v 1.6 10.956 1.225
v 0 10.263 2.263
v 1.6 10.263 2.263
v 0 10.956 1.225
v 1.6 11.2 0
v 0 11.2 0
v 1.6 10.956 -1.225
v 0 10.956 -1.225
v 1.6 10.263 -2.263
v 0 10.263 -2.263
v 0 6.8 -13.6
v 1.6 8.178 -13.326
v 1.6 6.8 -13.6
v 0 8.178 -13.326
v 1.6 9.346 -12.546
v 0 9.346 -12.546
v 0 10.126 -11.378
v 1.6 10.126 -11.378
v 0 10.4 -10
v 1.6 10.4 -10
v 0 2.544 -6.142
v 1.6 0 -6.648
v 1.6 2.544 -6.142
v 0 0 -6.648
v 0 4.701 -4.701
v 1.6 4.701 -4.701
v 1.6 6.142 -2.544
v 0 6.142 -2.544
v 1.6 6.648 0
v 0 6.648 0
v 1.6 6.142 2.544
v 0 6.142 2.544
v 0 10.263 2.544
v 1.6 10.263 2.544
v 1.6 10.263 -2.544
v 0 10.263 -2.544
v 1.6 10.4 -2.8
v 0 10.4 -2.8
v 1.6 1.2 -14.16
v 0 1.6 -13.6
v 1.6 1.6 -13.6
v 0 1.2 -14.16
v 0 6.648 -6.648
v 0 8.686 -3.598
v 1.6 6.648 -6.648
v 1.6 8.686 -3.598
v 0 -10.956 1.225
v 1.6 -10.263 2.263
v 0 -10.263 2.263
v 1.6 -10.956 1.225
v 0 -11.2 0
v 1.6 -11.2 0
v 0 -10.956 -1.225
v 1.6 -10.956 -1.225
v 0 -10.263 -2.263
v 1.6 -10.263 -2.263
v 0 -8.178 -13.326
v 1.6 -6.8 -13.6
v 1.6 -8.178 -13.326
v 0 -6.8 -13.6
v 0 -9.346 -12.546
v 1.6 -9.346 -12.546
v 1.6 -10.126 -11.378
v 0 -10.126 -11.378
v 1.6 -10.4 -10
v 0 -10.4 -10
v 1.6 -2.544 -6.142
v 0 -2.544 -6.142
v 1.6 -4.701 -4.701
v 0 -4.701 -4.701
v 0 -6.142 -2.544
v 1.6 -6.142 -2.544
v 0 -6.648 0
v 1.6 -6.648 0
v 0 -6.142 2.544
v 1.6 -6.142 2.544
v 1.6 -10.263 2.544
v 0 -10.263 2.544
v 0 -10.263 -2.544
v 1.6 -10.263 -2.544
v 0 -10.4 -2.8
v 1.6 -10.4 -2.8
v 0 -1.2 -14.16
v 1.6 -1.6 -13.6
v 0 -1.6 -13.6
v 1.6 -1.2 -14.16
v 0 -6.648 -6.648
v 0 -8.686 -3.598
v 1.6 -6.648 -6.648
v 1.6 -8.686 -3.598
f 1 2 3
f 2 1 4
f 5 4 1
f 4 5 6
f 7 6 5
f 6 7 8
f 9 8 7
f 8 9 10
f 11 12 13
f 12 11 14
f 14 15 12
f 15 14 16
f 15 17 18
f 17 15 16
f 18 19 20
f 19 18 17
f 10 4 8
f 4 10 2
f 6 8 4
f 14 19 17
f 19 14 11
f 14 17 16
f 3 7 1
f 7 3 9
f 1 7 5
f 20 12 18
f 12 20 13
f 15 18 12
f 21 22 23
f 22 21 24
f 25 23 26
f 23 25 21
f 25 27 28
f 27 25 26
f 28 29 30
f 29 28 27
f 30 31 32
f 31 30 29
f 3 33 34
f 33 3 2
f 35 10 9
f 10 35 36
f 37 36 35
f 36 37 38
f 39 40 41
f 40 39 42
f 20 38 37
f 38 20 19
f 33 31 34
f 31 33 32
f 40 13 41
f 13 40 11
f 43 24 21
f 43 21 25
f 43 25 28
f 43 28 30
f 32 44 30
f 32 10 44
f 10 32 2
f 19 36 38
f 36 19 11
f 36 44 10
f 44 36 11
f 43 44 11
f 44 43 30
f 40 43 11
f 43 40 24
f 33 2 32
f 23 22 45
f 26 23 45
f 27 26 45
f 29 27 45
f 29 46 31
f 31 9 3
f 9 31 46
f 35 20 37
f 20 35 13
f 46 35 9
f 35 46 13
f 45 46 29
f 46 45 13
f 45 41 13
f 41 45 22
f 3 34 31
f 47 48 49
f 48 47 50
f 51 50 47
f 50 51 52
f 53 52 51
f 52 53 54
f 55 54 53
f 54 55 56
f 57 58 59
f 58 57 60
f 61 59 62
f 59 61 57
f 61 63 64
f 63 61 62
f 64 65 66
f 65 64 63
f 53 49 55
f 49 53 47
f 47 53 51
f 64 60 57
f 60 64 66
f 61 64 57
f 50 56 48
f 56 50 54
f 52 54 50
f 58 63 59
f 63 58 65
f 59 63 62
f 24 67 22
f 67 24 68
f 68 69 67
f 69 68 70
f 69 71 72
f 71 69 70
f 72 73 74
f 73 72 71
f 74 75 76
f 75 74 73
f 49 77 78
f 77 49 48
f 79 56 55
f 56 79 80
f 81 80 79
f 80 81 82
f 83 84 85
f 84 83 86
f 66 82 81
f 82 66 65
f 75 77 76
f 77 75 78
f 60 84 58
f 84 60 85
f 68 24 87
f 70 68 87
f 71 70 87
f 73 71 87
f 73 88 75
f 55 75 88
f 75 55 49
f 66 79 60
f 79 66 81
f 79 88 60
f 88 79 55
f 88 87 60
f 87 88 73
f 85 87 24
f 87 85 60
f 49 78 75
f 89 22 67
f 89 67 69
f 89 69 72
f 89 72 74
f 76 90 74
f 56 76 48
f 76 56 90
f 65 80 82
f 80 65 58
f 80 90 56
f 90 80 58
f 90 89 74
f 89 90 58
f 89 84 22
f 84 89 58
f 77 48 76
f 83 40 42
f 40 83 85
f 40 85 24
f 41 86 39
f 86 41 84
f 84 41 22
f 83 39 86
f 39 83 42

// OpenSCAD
// file: ../p/5-16edge.scad
use <../lib.scad>
function ldraw_lib__5_16edge() = [
// 0 Circle 0.3125
// 0 Name: 5-16edge.dat
// 0 Author: Philippe Hurbain [Philo]
// 0 !LDRAW_ORG Primitive UPDATE 2009-03
// 0 !LICENSE Licensed under CC BY 2.0 and CC BY 4.0 : see CAreadme.txt
// 
// 0 BFC CERTIFY CCW
  [0,"BFC","CERTIFY"],
  [0,"BFC","CCW"],
// 
// 0 !HISTORY 2009-12-29 [PTadmin] Official Update 2009-03
// 
// 
// 2 24 1 0 0 0.9239 0 0.3827
  [2,24,1,0,0,0.9239,0,0.3827],
// 2 24 0.9239 0 0.3827 0.7071 0 0.7071
  [2,24,0.9239,0,0.3827,0.7071,0,0.7071],
// 2 24 0.7071 0 0.7071 0.3827 0 0.9239
  [2,24,0.7071,0,0.7071,0.3827,0,0.9239],
// 2 24 0.3827 0 0.9239 0 0 1
  [2,24,0.3827,0,0.9239,0,0,1],
// 2 24 0 0 1 -0.3827 0 0.9239
  [2,24,0,0,1,-0.3827,0,0.9239],
// 
// 0 end of file
// 
];
module ldraw_lib__5_16edge(step=0, col=false, unit=2/5, alt=false, line=0.2, solid=!$preview)
    makepoly(ldraw_lib__5_16edge(), step=step, col=col, unit=unit, alt=alt, line=line, solid=solid);
ldraw_lib__5_16edge(line=0.2);
// file: ../p/5-16cyli.scad
use <../lib.scad>
function ldraw_lib__5_16cyli() = [
// 0 Cylinder 0.3125
// 0 Name: 5-16cyli.dat
// 0 Author: Philippe Hurbain [Philo]
// 0 !LDRAW_ORG Primitive UPDATE 2009-03
// 0 !LICENSE Licensed under CC BY 2.0 and CC BY 4.0 : see CAreadme.txt
// 
// 0 BFC CERTIFY CCW
  [0,"BFC","CERTIFY"],
  [0,"BFC","CCW"],
// 
// 0 !HISTORY 2009-12-29 [PTadmin] Official Update 2009-03
// 
// 
// 4 16 0.9239 0 0.3827 1 0 0 1 1 0 0.9239 1 0.3827
  [4,16,0.9239,0,0.3827,1,0,0,1,1,0,0.9239,1,0.3827],
// 4 16 0.7071 0 0.7071 0.9239 0 0.3827 0.9239 1 0.3827 0.7071 1 0.7071
  [4,16,0.7071,0,0.7071,0.9239,0,0.3827,0.9239,1,0.3827,0.7071,1,0.7071],
// 4 16 0.3827 0 0.9239 0.7071 0 0.7071 0.7071 1 0.7071 0.3827 1 0.9239
  [4,16,0.3827,0,0.9239,0.7071,0,0.7071,0.7071,1,0.7071,0.3827,1,0.9239],
// 4 16 0 0 1 0.3827 0 0.9239 0.3827 1 0.9239 0 1 1
  [4,16,0,0,1,0.3827,0,0.9239,0.3827,1,0.9239,0,1,1],
// 4 16 -0.3827 0 0.9239 0 0 1 0 1 1 -0.3827 1 0.9239
  [4,16,-0.3827,0,0.9239,0,0,1,0,1,1,-0.3827,1,0.9239],
// 
// 0 conditional lines
// 5 24 1 1 0 1 0 0 1 1 -0.4142 0.9239 1 0.3827
  [5,24,1,1,0,1,0,0,1,1,-0.4142,0.9239,1,0.3827],
// 5 24 0.9239 1 0.3827 0.9239 0 0.3827 1 1 0 0.7071 1 0.7071
  [5,24,0.9239,1,0.3827,0.9239,0,0.3827,1,1,0,0.7071,1,0.7071],
// 5 24 0.7071 1 0.7071 0.7071 0 0.7071 0.9239 1 0.3827 0.3827 1 0.9239
  [5,24,0.7071,1,0.7071,0.7071,0,0.7071,0.9239,1,0.3827,0.3827,1,0.9239],
// 5 24 0.3827 1 0.9239 0.3827 0 0.9239 0.7071 1 0.7071 0 1 1
  [5,24,0.3827,1,0.9239,0.3827,0,0.9239,0.7071,1,0.7071,0,1,1],
// 5 24 0 1 1 0 0 1 0.3827 1 0.9239 -0.3827 1 0.9239
  [5,24,0,1,1,0,0,1,0.3827,1,0.9239,-0.3827,1,0.9239],
// 5 24 -0.3827 1 0.9239 -0.3827 0 0.9239 0 1 1 -0.7654 1 0.7654
  [5,24,-0.3827,1,0.9239,-0.3827,0,0.9239,0,1,1,-0.7654,1,0.7654],
// 
// 0 end of file
// 
];
module ldraw_lib__5_16cyli(step=0, col=false, unit=2/5, alt=false, line=0.2, solid=!$preview)
    makepoly(ldraw_lib__5_16cyli(), step=step, col=col, unit=unit, alt=alt, line=line, solid=solid);
ldraw_lib__5_16cyli(line=0.2);
// file: ../p/1-4edge.scad
use <../lib.scad>
function ldraw_lib__1_4edge() = [
// 0 Circle 0.25
// 0 Name: 1-4edge.dat
// 0 Author: James Jessiman
// 0 !LDRAW_ORG Primitive UPDATE 2017-01
// 0 !LICENSE Licensed under CC BY 2.0 and CC BY 4.0 : see CAreadme.txt
// 
// 0 BFC CERTIFY CCW
  [0,"BFC","CERTIFY"],
  [0,"BFC","CCW"],
// 
// 0 !HISTORY 2007-06-22 [PTadmin] Header formatted for Contributor Agreement
// 0 !HISTORY 2008-07-01 [PTadmin] Official Update 2008-01
// 0 !HISTORY 2017-01-15 [Steffen] BFCed
// 0 !HISTORY 2017-12-30 [PTadmin] Official Update 2017-01
// 
// 
// 2 24 1 0 0 0.9239 0 0.3827
  [2,24,1,0,0,0.9239,0,0.3827],
// 2 24 0.9239 0 0.3827 0.7071 0 0.7071
  [2,24,0.9239,0,0.3827,0.7071,0,0.7071],
// 2 24 0.7071 0 0.7071 0.3827 0 0.9239
  [2,24,0.7071,0,0.7071,0.3827,0,0.9239],
// 2 24 0.3827 0 0.9239 0 0 1
  [2,24,0.3827,0,0.9239,0,0,1],
];
module ldraw_lib__1_4edge(step=0, col=false, unit=2/5, alt=false, line=0.2, solid=!$preview)
    makepoly(ldraw_lib__1_4edge(), step=step, col=col, unit=unit, alt=alt, line=line, solid=solid);
ldraw_lib__1_4edge(line=0.2);
// file: ../p/1-4cyli.scad
use <../lib.scad>
function ldraw_lib__1_4cyli() = [
// 0 Cylinder 0.25
// 0 Name: 1-4cyli.dat
// 0 Author: James Jessiman
// 0 !LDRAW_ORG Primitive UPDATE 2012-01
// 0 !LICENSE Licensed under CC BY 2.0 and CC BY 4.0 : see CAreadme.txt
// 
// 0 BFC CERTIFY CCW
  [0,"BFC","CERTIFY"],
  [0,"BFC","CCW"],
// 
// 0 !HISTORY 2002-03-23 [sbliss] Added BFC statement.
// 0 !HISTORY 2002-04-25 [PTadmin] Official Update 2002-02
// 0 !HISTORY 2007-06-22 [PTadmin] Header formatted for Contributor Agreement
// 0 !HISTORY 2008-07-01 [PTadmin] Official Update 2008-01
// 0 !HISTORY 2012-02-16 [Philo] Changed to CCW
// 0 !HISTORY 2012-03-30 [PTadmin] Official Update 2012-01
// 
// 
// 4 16 1 1 0 0.9239 1 0.3827 0.9239 0 0.3827 1 0 0
  [4,16,1,1,0,0.9239,1,0.3827,0.9239,0,0.3827,1,0,0],
// 5 24 1 0 0 1 1 0 0.9239 0 0.3827 1 0 -1
  [5,24,1,0,0,1,1,0,0.9239,0,0.3827,1,0,-1],
// 4 16 0.9239 1 0.3827 0.7071 1 0.7071 0.7071 0 0.7071 0.9239 0 0.3827
  [4,16,0.9239,1,0.3827,0.7071,1,0.7071,0.7071,0,0.7071,0.9239,0,0.3827],
// 5 24 0.9239 0 0.3827 0.9239 1 0.3827 0.7071 0 0.7071 1 0 0
  [5,24,0.9239,0,0.3827,0.9239,1,0.3827,0.7071,0,0.7071,1,0,0],
// 4 16 0.7071 1 0.7071 0.3827 1 0.9239 0.3827 0 0.9239 0.7071 0 0.7071
  [4,16,0.7071,1,0.7071,0.3827,1,0.9239,0.3827,0,0.9239,0.7071,0,0.7071],
// 5 24 0.7071 0 0.7071 0.7071 1 0.7071 0.3827 0 0.9239 0.9239 0 0.3827
  [5,24,0.7071,0,0.7071,0.7071,1,0.7071,0.3827,0,0.9239,0.9239,0,0.3827],
// 4 16 0.3827 1 0.9239 0 1 1 0 0 1 0.3827 0 0.9239
  [4,16,0.3827,1,0.9239,0,1,1,0,0,1,0.3827,0,0.9239],
// 5 24 0.3827 0 0.9239 0.3827 1 0.9239 0 0 1 0.7071 0 0.7071
  [5,24,0.3827,0,0.9239,0.3827,1,0.9239,0,0,1,0.7071,0,0.7071],
// 5 24 0 0 1 0 1 1 0.3827 0 0.9239 -1 0 1
  [5,24,0,0,1,0,1,1,0.3827,0,0.9239,-1,0,1],
];
module ldraw_lib__1_4cyli(step=0, col=false, unit=2/5, alt=false, line=0.2, solid=!$preview)
    makepoly(ldraw_lib__1_4cyli(), step=step, col=col, unit=unit, alt=alt, line=line, solid=solid);
ldraw_lib__1_4cyli(line=0.2);
// file: ../p/rect3.scad
use <../lib.scad>
function ldraw_lib__rect3() = [
// 0 Rectangle with 3 Edges
// 0 Name: rect3.dat
// 0 Author: Mark Kennedy [mkennedy]
// 0 !LDRAW_ORG Primitive UPDATE 2010-01
// 0 !LICENSE Licensed under CC BY 2.0 and CC BY 4.0 : see CAreadme.txt
// 
// 0 BFC CERTIFY CCW
  [0,"BFC","CERTIFY"],
  [0,"BFC","CCW"],
// 
// 0 !HISTORY 2003-08-01 [PTadmin] Official Update 2003-02
// 0 !HISTORY 2007-06-24 [PTadmin] Header formatted for Contributor Agreement
// 0 !HISTORY 2008-07-01 [PTadmin] Official Update 2008-01
// 0 !HISTORY 2010-01-17 [mikeheide] Change winding to CCW
// 0 !HISTORY 2010-04-05 [PTadmin] Official Update 2010-01
// 
// 
// 2 24 1 0 1 -1 0 1
  [2,24,1,0,1,-1,0,1],
// 2 24 1 0 1 1 0 -1
  [2,24,1,0,1,1,0,-1],
// 2 24 -1 0 1 -1 0 -1
  [2,24,-1,0,1,-1,0,-1],
// 4 16 -1 0 1 -1 0 -1 1 0 -1 1 0 1
  [4,16,-1,0,1,-1,0,-1,1,0,-1,1,0,1],
// 0 //
];
module ldraw_lib__rect3(step=0, col=false, unit=2/5, alt=false, line=0.2, solid=!$preview)
    makepoly(ldraw_lib__rect3(), step=step, col=col, unit=unit, alt=alt, line=line, solid=solid);
ldraw_lib__rect3(line=0.2);
// file: ../p/rect2p.scad
use <../lib.scad>
function ldraw_lib__rect2p() = [
// 0 Rectangle with 2 Parallel Edges
// 0 Name: rect2p.dat
// 0 Author: Donald Sutter [technog]
// 0 !LDRAW_ORG Primitive UPDATE 2010-01
// 0 !LICENSE Licensed under CC BY 2.0 and CC BY 4.0 : see CAreadme.txt
// 
// 0 BFC CERTIFY CCW
  [0,"BFC","CERTIFY"],
  [0,"BFC","CCW"],
// 
// 0 !HISTORY 2003-08-01 [PTadmin] Official Update 2003-02
// 0 !HISTORY 2007-06-24 [PTadmin] Header formatted for Contributor Agreement
// 0 !HISTORY 2008-07-01 [PTadmin] Official Update 2008-01
// 0 !HISTORY 2010-01-17 [mikeheide] changed winding to CCW
// 0 !HISTORY 2010-04-05 [PTadmin] Official Update 2010-01
// 
// 
// 2 24 1 0 1 -1 0 1
  [2,24,1,0,1,-1,0,1],
// 2 24 -1 0 -1 1 0 -1
  [2,24,-1,0,-1,1,0,-1],
// 4 16 -1 0 1 -1 0 -1 1 0 -1 1 0 1
  [4,16,-1,0,1,-1,0,-1,1,0,-1,1,0,1],
// 0
];
module ldraw_lib__rect2p(step=0, col=false, unit=2/5, alt=false, line=0.2, solid=!$preview)
    makepoly(ldraw_lib__rect2p(), step=step, col=col, unit=unit, alt=alt, line=line, solid=solid);
ldraw_lib__rect2p(line=0.2);
// file: ../p/rect.scad
use <../lib.scad>
function ldraw_lib__rect() = [
// 0 Rectangle
// 0 Name: rect.dat
// 0 Author: James Jessiman
// 0 !LDRAW_ORG Primitive UPDATE 2010-01
// 0 !LICENSE Licensed under CC BY 2.0 and CC BY 4.0 : see CAreadme.txt
// 
// 0 BFC CERTIFY CCW
  [0,"BFC","CERTIFY"],
  [0,"BFC","CCW"],
// 
// 0 !HISTORY 2002-04-05 [hafhead] Added BFC statement
// 0 !HISTORY 2002-04-25 [PTadmin] Official Update 2002-02
// 0 !HISTORY 2007-06-24 [PTadmin] Header formatted for Contributor Agreement
// 0 !HISTORY 2008-07-01 [PTadmin] Official Update 2008-01
// 0 !HISTORY 2010-01-17 [mikeheide] changed winding to CCW
// 0 !HISTORY 2010-04-05 [PTadmin] Official Update 2010-01
// 
// 
// 2 24 1 0 1 -1 0 1
  [2,24,1,0,1,-1,0,1],
// 2 24 -1 0 1 -1 0 -1
  [2,24,-1,0,1,-1,0,-1],
// 2 24 -1 0 -1 1 0 -1
  [2,24,-1,0,-1,1,0,-1],
// 2 24 1 0 -1 1 0 1
  [2,24,1,0,-1,1,0,1],
// 4 16 -1 0 1 -1 0 -1 1 0 -1 1 0 1
  [4,16,-1,0,1,-1,0,-1,1,0,-1,1,0,1],
// 0
];
module ldraw_lib__rect(step=0, col=false, unit=2/5, alt=false, line=0.2, solid=!$preview)
    makepoly(ldraw_lib__rect(), step=step, col=col, unit=unit, alt=alt, line=line, solid=solid);
ldraw_lib__rect(line=0.2);
// file: ../p/5-16cylo.scad
use <../lib.scad>
use <5-16cyli.scad>
use <5-16edge.scad>
function ldraw_lib__5_16cylo() = [
// 0 Cylinder Open 0.3125
// 0 Name: 5-16cylo.dat
// 0 Author: Max Martin Richter [MMR1988]
// 0 !LDRAW_ORG Primitive UPDATE 2013-01
// 0 !LICENSE Licensed under CC BY 2.0 and CC BY 4.0 : see CAreadme.txt
// 
// 0 BFC CERTIFY CCW
  [0,"BFC","CERTIFY"],
  [0,"BFC","CCW"],
// 
// 0 !HISTORY 2013-07-21 [PTadmin] Official Update 2013-01
// 
// 
// 1 16 0 0 0 1 0 0 0 1 0 0 0 1 5-16cyli.dat
  [1,16,0,0,0,1,0,0,0,1,0,0,0,1, ldraw_lib__5_16cyli()],
// 1 16 0 0 0 1 0 0 0 1 0 0 0 1 5-16edge.dat
  [1,16,0,0,0,1,0,0,0,1,0,0,0,1, ldraw_lib__5_16edge()],
// 1 16 0 1 0 1 0 0 0 1 0 0 0 1 5-16edge.dat
  [1,16,0,1,0,1,0,0,0,1,0,0,0,1, ldraw_lib__5_16edge()],
];
module ldraw_lib__5_16cylo(step=0, col=false, unit=2/5, alt=false, line=0.2, solid=!$preview)
    makepoly(ldraw_lib__5_16cylo(), step=step, col=col, unit=unit, alt=alt, line=line, solid=solid);
ldraw_lib__5_16cylo(line=0.2);
// file: ../p/1-4ndis.scad
use <../lib.scad>
function ldraw_lib__1_4ndis() = [
// 0 Disc Negative 0.25
// 0 Name: 1-4ndis.dat
// 0 Author: James Jessiman
// 0 !LDRAW_ORG Primitive UPDATE 2012-01
// 0 !LICENSE Licensed under CC BY 2.0 and CC BY 4.0 : see CAreadme.txt
// 
// 0 BFC CERTIFY CCW
  [0,"BFC","CERTIFY"],
  [0,"BFC","CCW"],
// 
// 0 !HISTORY 2002-03-23 [sbliss] Added BFC Statement
// 0 !HISTORY 2002-04-25 [PTadmin] Official Update 2002-02
// 0 !HISTORY 2007-06-22 [PTadmin] Header formatted for Contributor Agreement
// 0 !HISTORY 2008-07-01 [PTadmin] Official Update 2008-01
// 0 !HISTORY 2012-02-16 [Philo] Changed to CCW
// 0 !HISTORY 2012-03-30 [PTadmin] Official Update 2012-01
// 
// 
// 3 16 0.9239 0 0.3827 1 0 0 1 0 1
  [3,16,0.9239,0,0.3827,1,0,0,1,0,1],
// 3 16 0.7071 0 0.7071 0.9239 0 0.3827 1 0 1
  [3,16,0.7071,0,0.7071,0.9239,0,0.3827,1,0,1],
// 3 16 0.3827 0 0.9239 0.7071 0 0.7071 1 0 1
  [3,16,0.3827,0,0.9239,0.7071,0,0.7071,1,0,1],
// 3 16 0 0 1 0.3827 0 0.9239 1 0 1
  [3,16,0,0,1,0.3827,0,0.9239,1,0,1],
];
module ldraw_lib__1_4ndis(step=0, col=false, unit=2/5, alt=false, line=0.2, solid=!$preview)
    makepoly(ldraw_lib__1_4ndis(), step=step, col=col, unit=unit, alt=alt, line=line, solid=solid);
ldraw_lib__1_4ndis(line=0.2);
// file: ../p/1-4cylo.scad
use <../lib.scad>
use <1-4cyli.scad>
use <1-4edge.scad>
function ldraw_lib__1_4cylo() = [
// 0 Cylinder Open 0.25
// 0 Name: 1-4cylo.dat
// 0 Author: Max Martin Richter [MMR1988]
// 0 !LDRAW_ORG Primitive UPDATE 2010-03
// 0 !LICENSE Licensed under CC BY 2.0 and CC BY 4.0 : see CAreadme.txt
// 
// 0 BFC CERTIFY CCW
  [0,"BFC","CERTIFY"],
  [0,"BFC","CCW"],
// 
// 0 !HISTORY 2010-12-31 [PTadmin] Official Update 2010-03
// 
// 
// 1 16 0 0 0 1 0 0 0 1 0 0 0 1 1-4edge.dat
  [1,16,0,0,0,1,0,0,0,1,0,0,0,1, ldraw_lib__1_4edge()],
// 1 16 0 1 0 1 0 0 0 1 0 0 0 1 1-4edge.dat
  [1,16,0,1,0,1,0,0,0,1,0,0,0,1, ldraw_lib__1_4edge()],
// 1 16 0 0 0 1 0 0 0 1 0 0 0 1 1-4cyli.dat
  [1,16,0,0,0,1,0,0,0,1,0,0,0,1, ldraw_lib__1_4cyli()],
];
module ldraw_lib__1_4cylo(step=0, col=false, unit=2/5, alt=false, line=0.2, solid=!$preview)
    makepoly(ldraw_lib__1_4cylo(), step=step, col=col, unit=unit, alt=alt, line=line, solid=solid);
ldraw_lib__1_4cylo(line=0.2);
// file: ../p/1-4chrd.scad
use <../lib.scad>
function ldraw_lib__1_4chrd() = [
// 0 Chord 0.25
// 0 Name: 1-4chrd.dat
// 0 Author: Tony Hafner [hafhead]
// 0 !LDRAW_ORG Primitive UPDATE 2012-02
// 0 !LICENSE Licensed under CC BY 2.0 and CC BY 4.0 : see CAreadme.txt
// 
// 0 BFC CERTIFY CCW
  [0,"BFC","CERTIFY"],
  [0,"BFC","CCW"],
// 
// 0 !HISTORY 2004-04-22 [PTadmin] Official Update 2004-02
// 0 !HISTORY 2007-10-09 [PTadmin] Header formatted for Contributor Agreement
// 0 !HISTORY 2008-07-01 [PTadmin] Official Update 2008-01
// 0 !HISTORY 2012-08-02 [MMR1988] Re-creation with PrimGen2 and Rectifier
// 0 !HISTORY 2012-08-09 [PTadmin] Official Update 2012-02
// 
// 
// 4 16 0.9239 0 0.3827 0.3827 0 0.9239 0 0 1 1 0 0
  [4,16,0.9239,0,0.3827,0.3827,0,0.9239,0,0,1,1,0,0],
// 3 16 0.7071 0 0.7071 0.3827 0 0.9239 0.9239 0 0.3827
  [3,16,0.7071,0,0.7071,0.3827,0,0.9239,0.9239,0,0.3827],
];
module ldraw_lib__1_4chrd(step=0, col=false, unit=2/5, alt=false, line=0.2, solid=!$preview)
    makepoly(ldraw_lib__1_4chrd(), step=step, col=col, unit=unit, alt=alt, line=line, solid=solid);
ldraw_lib__1_4chrd(line=0.2);
// file: ../p/1-16ndis.scad
use <../lib.scad>
function ldraw_lib__1_16ndis() = [
// 0 Disc Negative 0.0625
// 0 Name: 1-16ndis.dat
// 0 Author: Niels Karsdorp [nielsk]
// 0 !LDRAW_ORG Primitive UPDATE 2009-01
// 0 !LICENSE Licensed under CC BY 2.0 and CC BY 4.0 : see CAreadme.txt
// 
// 0 BFC CERTIFY CCW
  [0,"BFC","CERTIFY"],
  [0,"BFC","CCW"],
// 
// 0 !HISTORY 2009-05-02 [PTadmin] Official Update 2009-01
// 
// 
// 3 16 1 0 0 1 0 1 0.9239 0 0.3827
  [3,16,1,0,0,1,0,1,0.9239,0,0.3827],
// 0
];
module ldraw_lib__1_16ndis(step=0, col=false, unit=2/5, alt=false, line=0.2, solid=!$preview)
    makepoly(ldraw_lib__1_16ndis(), step=step, col=col, unit=unit, alt=alt, line=line, solid=solid);
ldraw_lib__1_16ndis(line=0.2);
// main file
use <../lib.scad>
use <../p/1-16ndis.scad>
use <../p/1-4chrd.scad>
use <../p/1-4cylo.scad>
use <../p/1-4ndis.scad>
use <../p/5-16cylo.scad>
use <../p/rect.scad>
use <../p/rect2p.scad>
use <../p/rect3.scad>
function ldraw_lib__u9418() = [
// 0 ~Technic Pneumatic Valve with Axle Hole Back Cover
// 0 Name: u9418.dat
// 0 Author: Philippe Hurbain [Philo]
// 0 !LDRAW_ORG Part UPDATE 2019-02
// 0 !LICENSE Licensed under CC BY 2.0 and CC BY 4.0 : see CAreadme.txt
// 
// 0 BFC CERTIFY CCW
  [0,"BFC","CERTIFY"],
  [0,"BFC","CCW"],
// 
// 0 !HISTORY 2019-09-09 [PTadmin] Official Update 2019-02
// 
// 
// 1 16 0 0 20 0 4 0 -5.65685 0 5.65685 5.65685 0 5.65685 1-4cylo.dat
  [1,16,0,0,20,0,4,0,-5.65685,0,5.65685,5.65685,0,5.65685, ldraw_lib__1_4cylo()],
// 1 16 0 25 17 0 4 0 9 0 0 0 0 9 1-4cylo.dat
  [1,16,0,25,17,0,4,0,9,0,0,0,0,9, ldraw_lib__1_4cylo()],
// 1 16 0 0 20 0 1 0 -5.65685 0 5.65685 5.65685 0 5.65685 1-4chrd.dat
  [1,16,0,0,20,0,1,0,-5.65685,0,5.65685,5.65685,0,5.65685, ldraw_lib__1_4chrd()],
// 1 16 0 25 17 0 1 0 9 0 0 0 0 9 1-4chrd.dat
  [1,16,0,25,17,0,1,0,9,0,0,0,0,9, ldraw_lib__1_4chrd()],
// 1 16 4 0 20 0 -1 0 -5.65685 0 5.65685 5.65685 0 5.65685 1-4chrd.dat
  [1,16,4,0,20,0,-1,0,-5.65685,0,5.65685,5.65685,0,5.65685, ldraw_lib__1_4chrd()],
// 1 16 4 25 17 0 -1 0 9 0 0 0 0 9 1-4chrd.dat
  [1,16,4,25,17,0,-1,0,9,0,0,0,0,9, ldraw_lib__1_4chrd()],
// 0 BFC INVERTNEXT
  [0,"BFC","INVERTNEXT"],
// 1 16 0 0 0 0 4 0 16.62 0 0 0 0 16.62 5-16cylo.dat
  [1,16,0,0,0,0,4,0,16.62,0,0,0,0,16.62, ldraw_lib__5_16cylo()],
// 1 16 2 -6.0087 25.6569 2 0 0 0 0 0.3518 0 -1 0 rect.dat
  [1,16,2,-6.0087,25.6569,2,0,0,0,0,0.3518,0,-1,0, ldraw_lib__rect()],
// 1 16 2 6.0087 25.6569 0 0 -2 0.3518 0 0 0 -1 0 rect.dat
  [1,16,2,6.0087,25.6569,0,0,-2,0.3518,0,0,0,-1,0, ldraw_lib__rect()],
// 1 16 2 6.68025 25.82845 2 0 0 0 0 0.31975 0 -1 0.17155 rect3.dat
  [1,16,2,6.68025,25.82845,2,0,0,0,0,0.31975,0,-1,0.17155, ldraw_lib__rect3()],
// 1 16 2 34.7 3.5 2 0 0 0 0 0.7 0 -1 -0.5 rect.dat
  [1,16,2,34.7,3.5,2,0,0,0,0,0.7,0,-1,-0.5, ldraw_lib__rect()],
// 
// 1 16 2 16 26 0 0 2 -9 0 0 0 -1 0 rect2p.dat
  [1,16,2,16,26,0,0,2,-9,0,0,0,-1,0, ldraw_lib__rect2p()],
// 1 16 2 -6.3605 20.50605 -2 0 0 0 1 0 0 0 -5.15085 rect3.dat
  [1,16,2,-6.3605,20.50605,-2,0,0,0,1,0,0,0,-5.15085, ldraw_lib__rect3()],
// 1 16 2 34 10.5 0 0 2 0 -1 0 6.5 0 0 rect2p.dat
  [1,16,2,34,10.5,0,0,2,0,-1,0,6.5,0,0, ldraw_lib__rect2p()],
// 1 16 0 0 0 0 1 0 16.62 0 0 0 0 16.62 1-4ndis.dat
  [1,16,0,0,0,0,1,0,16.62,0,0,0,0,16.62, ldraw_lib__1_4ndis()],
// 1 16 0 0 0 0 1 0 -6.3602 0 15.35488 15.35488 0 6.3602 1-16ndis.dat
  [1,16,0,0,0,0,1,0,-6.3602,0,15.35488,15.35488,0,6.3602, ldraw_lib__1_16ndis()],
// 4 16 0 5.6569 25.6569 0 8.9947 21.7151 0 -6.3605 15.3552 0 -5.6569 25.6569
  [4,16,0,5.6569,25.6569,0,8.9947,21.7151,0,-6.3605,15.3552,0,-5.6569,25.6569],
// 4 16 0 7 26 0 25 26 0 34 17 0 6.3605 25.6569
  [4,16,0,7,26,0,25,26,0,34,17,0,6.3605,25.6569],
// 4 16 0 5.6569 25.6569 0 6.3605 25.6569 0 34 17 0 8.9947 21.7151
  [4,16,0,5.6569,25.6569,0,6.3605,25.6569,0,34,17,0,8.9947,21.7151],
// 4 16 0 8.9947 21.7151 0 34 17 0 16.62 16.62 0 0 16.62
  [4,16,0,8.9947,21.7151,0,34,17,0,16.62,16.62,0,0,16.62],
// 4 16 0 16.62 0 0 16.62 16.62 0 34 17 0 34 4
  [4,16,0,16.62,0,0,16.62,16.62,0,34,17,0,34,4],
// 3 16 0 -6.3605 25.6569 0 -5.6569 25.6569 0 -6.3605 15.3552
  [3,16,0,-6.3605,25.6569,0,-5.6569,25.6569,0,-6.3605,15.3552],
// 1 16 4 0 0 0 -1 0 16.62 0 0 0 0 16.62 1-4ndis.dat
  [1,16,4,0,0,0,-1,0,16.62,0,0,0,0,16.62, ldraw_lib__1_4ndis()],
// 1 16 4 0 0 0 -1 0 -6.3602 0 15.35488 15.35488 0 6.3602 1-16ndis.dat
  [1,16,4,0,0,0,-1,0,-6.3602,0,15.35488,15.35488,0,6.3602, ldraw_lib__1_16ndis()],
// 4 16 4 -6.3605 15.3552 4 8.9947 21.7151 4 5.6569 25.6569 4 -5.6569 25.6569
  [4,16,4,-6.3605,15.3552,4,8.9947,21.7151,4,5.6569,25.6569,4,-5.6569,25.6569],
// 4 16 4 34 17 4 25 26 4 7 26 4 6.3605 25.6569
  [4,16,4,34,17,4,25,26,4,7,26,4,6.3605,25.6569],
// 4 16 4 34 17 4 6.3605 25.6569 4 5.6569 25.6569 4 8.9947 21.7151
  [4,16,4,34,17,4,6.3605,25.6569,4,5.6569,25.6569,4,8.9947,21.7151],
// 4 16 4 16.62 16.62 4 34 17 4 8.9947 21.7151 4 0 16.62
  [4,16,4,16.62,16.62,4,34,17,4,8.9947,21.7151,4,0,16.62],
// 4 16 4 34 17 4 16.62 16.62 4 16.62 0 4 34 4
  [4,16,4,34,17,4,16.62,16.62,4,16.62,0,4,34,4],
// 3 16 4 -5.6569 25.6569 4 -6.3605 25.6569 4 -6.3605 15.3552
  [3,16,4,-5.6569,25.6569,4,-6.3605,25.6569,4,-6.3605,15.3552],
// 1 16 0 0 -20 0 4 0 -5.65685 0 5.65685 -5.65685 0 -5.65685 1-4cylo.dat
  [1,16,0,0,-20,0,4,0,-5.65685,0,5.65685,-5.65685,0,-5.65685, ldraw_lib__1_4cylo()],
// 1 16 0 25 -17 0 4 0 9 0 0 0 0 -9 1-4cylo.dat
  [1,16,0,25,-17,0,4,0,9,0,0,0,0,-9, ldraw_lib__1_4cylo()],
// 1 16 0 0 -20 0 1 0 -5.65685 0 5.65685 -5.65685 0 -5.65685 1-4chrd.dat
  [1,16,0,0,-20,0,1,0,-5.65685,0,5.65685,-5.65685,0,-5.65685, ldraw_lib__1_4chrd()],
// 1 16 0 25 -17 0 1 0 9 0 0 0 0 -9 1-4chrd.dat
  [1,16,0,25,-17,0,1,0,9,0,0,0,0,-9, ldraw_lib__1_4chrd()],
// 1 16 4 0 -20 0 -1 0 -5.65685 0 5.65685 -5.65685 0 -5.65685 1-4chrd.dat
  [1,16,4,0,-20,0,-1,0,-5.65685,0,5.65685,-5.65685,0,-5.65685, ldraw_lib__1_4chrd()],
// 1 16 4 25 -17 0 -1 0 9 0 0 0 0 -9 1-4chrd.dat
  [1,16,4,25,-17,0,-1,0,9,0,0,0,0,-9, ldraw_lib__1_4chrd()],
// 0 BFC INVERTNEXT
  [0,"BFC","INVERTNEXT"],
// 1 16 0 0 0 0 4 0 16.62 0 0 0 0 -16.62 5-16cylo.dat
  [1,16,0,0,0,0,4,0,16.62,0,0,0,0,-16.62, ldraw_lib__5_16cylo()],
// 1 16 2 -6.0087 -25.6569 0 0 -2 -0.3518 0 0 0 1 0 rect.dat
  [1,16,2,-6.0087,-25.6569,0,0,-2,-0.3518,0,0,0,1,0, ldraw_lib__rect()],
// 1 16 2 6.0087 -25.6569 2 0 0 0 0 -0.3518 0 1 0 rect.dat
  [1,16,2,6.0087,-25.6569,2,0,0,0,0,-0.3518,0,1,0, ldraw_lib__rect()],
// 1 16 2 6.68025 -25.82845 -2 0 0 0 0 0.31975 0 1 -0.17155 rect3.dat
  [1,16,2,6.68025,-25.82845,-2,0,0,0,0,0.31975,0,1,-0.17155, ldraw_lib__rect3()],
// 1 16 2 34.7 -3.5 0 0 -2 -0.7 0 0 -0.5 1 0 rect.dat
  [1,16,2,34.7,-3.5,0,0,-2,-0.7,0,0,-0.5,1,0, ldraw_lib__rect()],
// 1 16 2 16 -26 0 0 2 9 0 0 0 1 0 rect2p.dat
  [1,16,2,16,-26,0,0,2,9,0,0,0,1,0, ldraw_lib__rect2p()],
// 1 16 2 -6.3605 -20.50605 2 0 0 0 1 0 0 0 5.15085 rect3.dat
  [1,16,2,-6.3605,-20.50605,2,0,0,0,1,0,0,0,5.15085, ldraw_lib__rect3()],
// 1 16 2 34 -10.5 0 0 2 0 -1 0 6.5 0 0 rect2p.dat
  [1,16,2,34,-10.5,0,0,2,0,-1,0,6.5,0,0, ldraw_lib__rect2p()],
// 1 16 0 0 0 0 1 0 16.62 0 0 0 0 -16.62 1-4ndis.dat
  [1,16,0,0,0,0,1,0,16.62,0,0,0,0,-16.62, ldraw_lib__1_4ndis()],
// 1 16 0 0 0 0 1 0 -6.3602 0 15.35488 -15.35488 0 -6.3602 1-16ndis.dat
  [1,16,0,0,0,0,1,0,-6.3602,0,15.35488,-15.35488,0,-6.3602, ldraw_lib__1_16ndis()],
// 4 16 0 -6.3605 -15.3552 0 8.9947 -21.7151 0 5.6569 -25.6569 0 -5.6569 -25.6569
  [4,16,0,-6.3605,-15.3552,0,8.9947,-21.7151,0,5.6569,-25.6569,0,-5.6569,-25.6569],
// 4 16 0 34 -17 0 25 -26 0 7 -26 0 6.3605 -25.6569
  [4,16,0,34,-17,0,25,-26,0,7,-26,0,6.3605,-25.6569],
// 4 16 0 34 -17 0 6.3605 -25.6569 0 5.6569 -25.6569 0 8.9947 -21.7151
  [4,16,0,34,-17,0,6.3605,-25.6569,0,5.6569,-25.6569,0,8.9947,-21.7151],
// 4 16 0 16.62 -16.62 0 34 -17 0 8.9947 -21.7151 0 0 -16.62
  [4,16,0,16.62,-16.62,0,34,-17,0,8.9947,-21.7151,0,0,-16.62],
// 4 16 0 34 -17 0 16.62 -16.62 0 16.62 0 0 34 -4
  [4,16,0,34,-17,0,16.62,-16.62,0,16.62,0,0,34,-4],
// 3 16 0 -5.6569 -25.6569 0 -6.3605 -25.6569 0 -6.3605 -15.3552
  [3,16,0,-5.6569,-25.6569,0,-6.3605,-25.6569,0,-6.3605,-15.3552],
// 1 16 4 0 0 0 -1 0 16.62 0 0 0 0 -16.62 1-4ndis.dat
  [1,16,4,0,0,0,-1,0,16.62,0,0,0,0,-16.62, ldraw_lib__1_4ndis()],
// 1 16 4 0 0 0 -1 0 -6.3602 0 15.35488 -15.35488 0 -6.3602 1-16ndis.dat
  [1,16,4,0,0,0,-1,0,-6.3602,0,15.35488,-15.35488,0,-6.3602, ldraw_lib__1_16ndis()],
// 4 16 4 5.6569 -25.6569 4 8.9947 -21.7151 4 -6.3605 -15.3552 4 -5.6569 -25.6569
  [4,16,4,5.6569,-25.6569,4,8.9947,-21.7151,4,-6.3605,-15.3552,4,-5.6569,-25.6569],
// 4 16 4 7 -26 4 25 -26 4 34 -17 4 6.3605 -25.6569
  [4,16,4,7,-26,4,25,-26,4,34,-17,4,6.3605,-25.6569],
// 4 16 4 5.6569 -25.6569 4 6.3605 -25.6569 4 34 -17 4 8.9947 -21.7151
  [4,16,4,5.6569,-25.6569,4,6.3605,-25.6569,4,34,-17,4,8.9947,-21.7151],
// 4 16 4 8.9947 -21.7151 4 34 -17 4 16.62 -16.62 4 0 -16.62
  [4,16,4,8.9947,-21.7151,4,34,-17,4,16.62,-16.62,4,0,-16.62],
// 4 16 4 16.62 0 4 16.62 -16.62 4 34 -17 4 34 -4
  [4,16,4,16.62,0,4,16.62,-16.62,4,34,-17,4,34,-4],
// 3 16 4 -6.3605 -25.6569 4 -5.6569 -25.6569 4 -6.3605 -15.3552
  [3,16,4,-6.3605,-25.6569,4,-5.6569,-25.6569,4,-6.3605,-15.3552],
// 4 16 0 34 -4 0 34 4 0 35.4 3 0 35.4 -3
  [4,16,0,34,-4,0,34,4,0,35.4,3,0,35.4,-3],
// 3 16 0 34 4 0 34 -4 0 16.62 0
  [3,16,0,34,4,0,34,-4,0,16.62,0],
// 4 16 4 35.4 3 4 34 4 4 34 -4 4 35.4 -3
  [4,16,4,35.4,3,4,34,4,4,34,-4,4,35.4,-3],
// 3 16 4 34 -4 4 34 4 4 16.62 0
  [3,16,4,34,-4,4,34,4,4,16.62,0],
// 1 16 2 35.4 0 0 0 2 0 -1 0 3 0 0 rect2p.dat
  [1,16,2,35.4,0,0,0,2,0,-1,0,3,0,0, ldraw_lib__rect2p()],
];
module ldraw_lib__u9418(step=0, col=false, unit=2/5, alt=false, line=0.2, solid=!$preview)
    makepoly(ldraw_lib__u9418(), step=step, col=col, unit=unit, alt=alt, line=line, solid=solid);
ldraw_lib__u9418(line=0.2);
